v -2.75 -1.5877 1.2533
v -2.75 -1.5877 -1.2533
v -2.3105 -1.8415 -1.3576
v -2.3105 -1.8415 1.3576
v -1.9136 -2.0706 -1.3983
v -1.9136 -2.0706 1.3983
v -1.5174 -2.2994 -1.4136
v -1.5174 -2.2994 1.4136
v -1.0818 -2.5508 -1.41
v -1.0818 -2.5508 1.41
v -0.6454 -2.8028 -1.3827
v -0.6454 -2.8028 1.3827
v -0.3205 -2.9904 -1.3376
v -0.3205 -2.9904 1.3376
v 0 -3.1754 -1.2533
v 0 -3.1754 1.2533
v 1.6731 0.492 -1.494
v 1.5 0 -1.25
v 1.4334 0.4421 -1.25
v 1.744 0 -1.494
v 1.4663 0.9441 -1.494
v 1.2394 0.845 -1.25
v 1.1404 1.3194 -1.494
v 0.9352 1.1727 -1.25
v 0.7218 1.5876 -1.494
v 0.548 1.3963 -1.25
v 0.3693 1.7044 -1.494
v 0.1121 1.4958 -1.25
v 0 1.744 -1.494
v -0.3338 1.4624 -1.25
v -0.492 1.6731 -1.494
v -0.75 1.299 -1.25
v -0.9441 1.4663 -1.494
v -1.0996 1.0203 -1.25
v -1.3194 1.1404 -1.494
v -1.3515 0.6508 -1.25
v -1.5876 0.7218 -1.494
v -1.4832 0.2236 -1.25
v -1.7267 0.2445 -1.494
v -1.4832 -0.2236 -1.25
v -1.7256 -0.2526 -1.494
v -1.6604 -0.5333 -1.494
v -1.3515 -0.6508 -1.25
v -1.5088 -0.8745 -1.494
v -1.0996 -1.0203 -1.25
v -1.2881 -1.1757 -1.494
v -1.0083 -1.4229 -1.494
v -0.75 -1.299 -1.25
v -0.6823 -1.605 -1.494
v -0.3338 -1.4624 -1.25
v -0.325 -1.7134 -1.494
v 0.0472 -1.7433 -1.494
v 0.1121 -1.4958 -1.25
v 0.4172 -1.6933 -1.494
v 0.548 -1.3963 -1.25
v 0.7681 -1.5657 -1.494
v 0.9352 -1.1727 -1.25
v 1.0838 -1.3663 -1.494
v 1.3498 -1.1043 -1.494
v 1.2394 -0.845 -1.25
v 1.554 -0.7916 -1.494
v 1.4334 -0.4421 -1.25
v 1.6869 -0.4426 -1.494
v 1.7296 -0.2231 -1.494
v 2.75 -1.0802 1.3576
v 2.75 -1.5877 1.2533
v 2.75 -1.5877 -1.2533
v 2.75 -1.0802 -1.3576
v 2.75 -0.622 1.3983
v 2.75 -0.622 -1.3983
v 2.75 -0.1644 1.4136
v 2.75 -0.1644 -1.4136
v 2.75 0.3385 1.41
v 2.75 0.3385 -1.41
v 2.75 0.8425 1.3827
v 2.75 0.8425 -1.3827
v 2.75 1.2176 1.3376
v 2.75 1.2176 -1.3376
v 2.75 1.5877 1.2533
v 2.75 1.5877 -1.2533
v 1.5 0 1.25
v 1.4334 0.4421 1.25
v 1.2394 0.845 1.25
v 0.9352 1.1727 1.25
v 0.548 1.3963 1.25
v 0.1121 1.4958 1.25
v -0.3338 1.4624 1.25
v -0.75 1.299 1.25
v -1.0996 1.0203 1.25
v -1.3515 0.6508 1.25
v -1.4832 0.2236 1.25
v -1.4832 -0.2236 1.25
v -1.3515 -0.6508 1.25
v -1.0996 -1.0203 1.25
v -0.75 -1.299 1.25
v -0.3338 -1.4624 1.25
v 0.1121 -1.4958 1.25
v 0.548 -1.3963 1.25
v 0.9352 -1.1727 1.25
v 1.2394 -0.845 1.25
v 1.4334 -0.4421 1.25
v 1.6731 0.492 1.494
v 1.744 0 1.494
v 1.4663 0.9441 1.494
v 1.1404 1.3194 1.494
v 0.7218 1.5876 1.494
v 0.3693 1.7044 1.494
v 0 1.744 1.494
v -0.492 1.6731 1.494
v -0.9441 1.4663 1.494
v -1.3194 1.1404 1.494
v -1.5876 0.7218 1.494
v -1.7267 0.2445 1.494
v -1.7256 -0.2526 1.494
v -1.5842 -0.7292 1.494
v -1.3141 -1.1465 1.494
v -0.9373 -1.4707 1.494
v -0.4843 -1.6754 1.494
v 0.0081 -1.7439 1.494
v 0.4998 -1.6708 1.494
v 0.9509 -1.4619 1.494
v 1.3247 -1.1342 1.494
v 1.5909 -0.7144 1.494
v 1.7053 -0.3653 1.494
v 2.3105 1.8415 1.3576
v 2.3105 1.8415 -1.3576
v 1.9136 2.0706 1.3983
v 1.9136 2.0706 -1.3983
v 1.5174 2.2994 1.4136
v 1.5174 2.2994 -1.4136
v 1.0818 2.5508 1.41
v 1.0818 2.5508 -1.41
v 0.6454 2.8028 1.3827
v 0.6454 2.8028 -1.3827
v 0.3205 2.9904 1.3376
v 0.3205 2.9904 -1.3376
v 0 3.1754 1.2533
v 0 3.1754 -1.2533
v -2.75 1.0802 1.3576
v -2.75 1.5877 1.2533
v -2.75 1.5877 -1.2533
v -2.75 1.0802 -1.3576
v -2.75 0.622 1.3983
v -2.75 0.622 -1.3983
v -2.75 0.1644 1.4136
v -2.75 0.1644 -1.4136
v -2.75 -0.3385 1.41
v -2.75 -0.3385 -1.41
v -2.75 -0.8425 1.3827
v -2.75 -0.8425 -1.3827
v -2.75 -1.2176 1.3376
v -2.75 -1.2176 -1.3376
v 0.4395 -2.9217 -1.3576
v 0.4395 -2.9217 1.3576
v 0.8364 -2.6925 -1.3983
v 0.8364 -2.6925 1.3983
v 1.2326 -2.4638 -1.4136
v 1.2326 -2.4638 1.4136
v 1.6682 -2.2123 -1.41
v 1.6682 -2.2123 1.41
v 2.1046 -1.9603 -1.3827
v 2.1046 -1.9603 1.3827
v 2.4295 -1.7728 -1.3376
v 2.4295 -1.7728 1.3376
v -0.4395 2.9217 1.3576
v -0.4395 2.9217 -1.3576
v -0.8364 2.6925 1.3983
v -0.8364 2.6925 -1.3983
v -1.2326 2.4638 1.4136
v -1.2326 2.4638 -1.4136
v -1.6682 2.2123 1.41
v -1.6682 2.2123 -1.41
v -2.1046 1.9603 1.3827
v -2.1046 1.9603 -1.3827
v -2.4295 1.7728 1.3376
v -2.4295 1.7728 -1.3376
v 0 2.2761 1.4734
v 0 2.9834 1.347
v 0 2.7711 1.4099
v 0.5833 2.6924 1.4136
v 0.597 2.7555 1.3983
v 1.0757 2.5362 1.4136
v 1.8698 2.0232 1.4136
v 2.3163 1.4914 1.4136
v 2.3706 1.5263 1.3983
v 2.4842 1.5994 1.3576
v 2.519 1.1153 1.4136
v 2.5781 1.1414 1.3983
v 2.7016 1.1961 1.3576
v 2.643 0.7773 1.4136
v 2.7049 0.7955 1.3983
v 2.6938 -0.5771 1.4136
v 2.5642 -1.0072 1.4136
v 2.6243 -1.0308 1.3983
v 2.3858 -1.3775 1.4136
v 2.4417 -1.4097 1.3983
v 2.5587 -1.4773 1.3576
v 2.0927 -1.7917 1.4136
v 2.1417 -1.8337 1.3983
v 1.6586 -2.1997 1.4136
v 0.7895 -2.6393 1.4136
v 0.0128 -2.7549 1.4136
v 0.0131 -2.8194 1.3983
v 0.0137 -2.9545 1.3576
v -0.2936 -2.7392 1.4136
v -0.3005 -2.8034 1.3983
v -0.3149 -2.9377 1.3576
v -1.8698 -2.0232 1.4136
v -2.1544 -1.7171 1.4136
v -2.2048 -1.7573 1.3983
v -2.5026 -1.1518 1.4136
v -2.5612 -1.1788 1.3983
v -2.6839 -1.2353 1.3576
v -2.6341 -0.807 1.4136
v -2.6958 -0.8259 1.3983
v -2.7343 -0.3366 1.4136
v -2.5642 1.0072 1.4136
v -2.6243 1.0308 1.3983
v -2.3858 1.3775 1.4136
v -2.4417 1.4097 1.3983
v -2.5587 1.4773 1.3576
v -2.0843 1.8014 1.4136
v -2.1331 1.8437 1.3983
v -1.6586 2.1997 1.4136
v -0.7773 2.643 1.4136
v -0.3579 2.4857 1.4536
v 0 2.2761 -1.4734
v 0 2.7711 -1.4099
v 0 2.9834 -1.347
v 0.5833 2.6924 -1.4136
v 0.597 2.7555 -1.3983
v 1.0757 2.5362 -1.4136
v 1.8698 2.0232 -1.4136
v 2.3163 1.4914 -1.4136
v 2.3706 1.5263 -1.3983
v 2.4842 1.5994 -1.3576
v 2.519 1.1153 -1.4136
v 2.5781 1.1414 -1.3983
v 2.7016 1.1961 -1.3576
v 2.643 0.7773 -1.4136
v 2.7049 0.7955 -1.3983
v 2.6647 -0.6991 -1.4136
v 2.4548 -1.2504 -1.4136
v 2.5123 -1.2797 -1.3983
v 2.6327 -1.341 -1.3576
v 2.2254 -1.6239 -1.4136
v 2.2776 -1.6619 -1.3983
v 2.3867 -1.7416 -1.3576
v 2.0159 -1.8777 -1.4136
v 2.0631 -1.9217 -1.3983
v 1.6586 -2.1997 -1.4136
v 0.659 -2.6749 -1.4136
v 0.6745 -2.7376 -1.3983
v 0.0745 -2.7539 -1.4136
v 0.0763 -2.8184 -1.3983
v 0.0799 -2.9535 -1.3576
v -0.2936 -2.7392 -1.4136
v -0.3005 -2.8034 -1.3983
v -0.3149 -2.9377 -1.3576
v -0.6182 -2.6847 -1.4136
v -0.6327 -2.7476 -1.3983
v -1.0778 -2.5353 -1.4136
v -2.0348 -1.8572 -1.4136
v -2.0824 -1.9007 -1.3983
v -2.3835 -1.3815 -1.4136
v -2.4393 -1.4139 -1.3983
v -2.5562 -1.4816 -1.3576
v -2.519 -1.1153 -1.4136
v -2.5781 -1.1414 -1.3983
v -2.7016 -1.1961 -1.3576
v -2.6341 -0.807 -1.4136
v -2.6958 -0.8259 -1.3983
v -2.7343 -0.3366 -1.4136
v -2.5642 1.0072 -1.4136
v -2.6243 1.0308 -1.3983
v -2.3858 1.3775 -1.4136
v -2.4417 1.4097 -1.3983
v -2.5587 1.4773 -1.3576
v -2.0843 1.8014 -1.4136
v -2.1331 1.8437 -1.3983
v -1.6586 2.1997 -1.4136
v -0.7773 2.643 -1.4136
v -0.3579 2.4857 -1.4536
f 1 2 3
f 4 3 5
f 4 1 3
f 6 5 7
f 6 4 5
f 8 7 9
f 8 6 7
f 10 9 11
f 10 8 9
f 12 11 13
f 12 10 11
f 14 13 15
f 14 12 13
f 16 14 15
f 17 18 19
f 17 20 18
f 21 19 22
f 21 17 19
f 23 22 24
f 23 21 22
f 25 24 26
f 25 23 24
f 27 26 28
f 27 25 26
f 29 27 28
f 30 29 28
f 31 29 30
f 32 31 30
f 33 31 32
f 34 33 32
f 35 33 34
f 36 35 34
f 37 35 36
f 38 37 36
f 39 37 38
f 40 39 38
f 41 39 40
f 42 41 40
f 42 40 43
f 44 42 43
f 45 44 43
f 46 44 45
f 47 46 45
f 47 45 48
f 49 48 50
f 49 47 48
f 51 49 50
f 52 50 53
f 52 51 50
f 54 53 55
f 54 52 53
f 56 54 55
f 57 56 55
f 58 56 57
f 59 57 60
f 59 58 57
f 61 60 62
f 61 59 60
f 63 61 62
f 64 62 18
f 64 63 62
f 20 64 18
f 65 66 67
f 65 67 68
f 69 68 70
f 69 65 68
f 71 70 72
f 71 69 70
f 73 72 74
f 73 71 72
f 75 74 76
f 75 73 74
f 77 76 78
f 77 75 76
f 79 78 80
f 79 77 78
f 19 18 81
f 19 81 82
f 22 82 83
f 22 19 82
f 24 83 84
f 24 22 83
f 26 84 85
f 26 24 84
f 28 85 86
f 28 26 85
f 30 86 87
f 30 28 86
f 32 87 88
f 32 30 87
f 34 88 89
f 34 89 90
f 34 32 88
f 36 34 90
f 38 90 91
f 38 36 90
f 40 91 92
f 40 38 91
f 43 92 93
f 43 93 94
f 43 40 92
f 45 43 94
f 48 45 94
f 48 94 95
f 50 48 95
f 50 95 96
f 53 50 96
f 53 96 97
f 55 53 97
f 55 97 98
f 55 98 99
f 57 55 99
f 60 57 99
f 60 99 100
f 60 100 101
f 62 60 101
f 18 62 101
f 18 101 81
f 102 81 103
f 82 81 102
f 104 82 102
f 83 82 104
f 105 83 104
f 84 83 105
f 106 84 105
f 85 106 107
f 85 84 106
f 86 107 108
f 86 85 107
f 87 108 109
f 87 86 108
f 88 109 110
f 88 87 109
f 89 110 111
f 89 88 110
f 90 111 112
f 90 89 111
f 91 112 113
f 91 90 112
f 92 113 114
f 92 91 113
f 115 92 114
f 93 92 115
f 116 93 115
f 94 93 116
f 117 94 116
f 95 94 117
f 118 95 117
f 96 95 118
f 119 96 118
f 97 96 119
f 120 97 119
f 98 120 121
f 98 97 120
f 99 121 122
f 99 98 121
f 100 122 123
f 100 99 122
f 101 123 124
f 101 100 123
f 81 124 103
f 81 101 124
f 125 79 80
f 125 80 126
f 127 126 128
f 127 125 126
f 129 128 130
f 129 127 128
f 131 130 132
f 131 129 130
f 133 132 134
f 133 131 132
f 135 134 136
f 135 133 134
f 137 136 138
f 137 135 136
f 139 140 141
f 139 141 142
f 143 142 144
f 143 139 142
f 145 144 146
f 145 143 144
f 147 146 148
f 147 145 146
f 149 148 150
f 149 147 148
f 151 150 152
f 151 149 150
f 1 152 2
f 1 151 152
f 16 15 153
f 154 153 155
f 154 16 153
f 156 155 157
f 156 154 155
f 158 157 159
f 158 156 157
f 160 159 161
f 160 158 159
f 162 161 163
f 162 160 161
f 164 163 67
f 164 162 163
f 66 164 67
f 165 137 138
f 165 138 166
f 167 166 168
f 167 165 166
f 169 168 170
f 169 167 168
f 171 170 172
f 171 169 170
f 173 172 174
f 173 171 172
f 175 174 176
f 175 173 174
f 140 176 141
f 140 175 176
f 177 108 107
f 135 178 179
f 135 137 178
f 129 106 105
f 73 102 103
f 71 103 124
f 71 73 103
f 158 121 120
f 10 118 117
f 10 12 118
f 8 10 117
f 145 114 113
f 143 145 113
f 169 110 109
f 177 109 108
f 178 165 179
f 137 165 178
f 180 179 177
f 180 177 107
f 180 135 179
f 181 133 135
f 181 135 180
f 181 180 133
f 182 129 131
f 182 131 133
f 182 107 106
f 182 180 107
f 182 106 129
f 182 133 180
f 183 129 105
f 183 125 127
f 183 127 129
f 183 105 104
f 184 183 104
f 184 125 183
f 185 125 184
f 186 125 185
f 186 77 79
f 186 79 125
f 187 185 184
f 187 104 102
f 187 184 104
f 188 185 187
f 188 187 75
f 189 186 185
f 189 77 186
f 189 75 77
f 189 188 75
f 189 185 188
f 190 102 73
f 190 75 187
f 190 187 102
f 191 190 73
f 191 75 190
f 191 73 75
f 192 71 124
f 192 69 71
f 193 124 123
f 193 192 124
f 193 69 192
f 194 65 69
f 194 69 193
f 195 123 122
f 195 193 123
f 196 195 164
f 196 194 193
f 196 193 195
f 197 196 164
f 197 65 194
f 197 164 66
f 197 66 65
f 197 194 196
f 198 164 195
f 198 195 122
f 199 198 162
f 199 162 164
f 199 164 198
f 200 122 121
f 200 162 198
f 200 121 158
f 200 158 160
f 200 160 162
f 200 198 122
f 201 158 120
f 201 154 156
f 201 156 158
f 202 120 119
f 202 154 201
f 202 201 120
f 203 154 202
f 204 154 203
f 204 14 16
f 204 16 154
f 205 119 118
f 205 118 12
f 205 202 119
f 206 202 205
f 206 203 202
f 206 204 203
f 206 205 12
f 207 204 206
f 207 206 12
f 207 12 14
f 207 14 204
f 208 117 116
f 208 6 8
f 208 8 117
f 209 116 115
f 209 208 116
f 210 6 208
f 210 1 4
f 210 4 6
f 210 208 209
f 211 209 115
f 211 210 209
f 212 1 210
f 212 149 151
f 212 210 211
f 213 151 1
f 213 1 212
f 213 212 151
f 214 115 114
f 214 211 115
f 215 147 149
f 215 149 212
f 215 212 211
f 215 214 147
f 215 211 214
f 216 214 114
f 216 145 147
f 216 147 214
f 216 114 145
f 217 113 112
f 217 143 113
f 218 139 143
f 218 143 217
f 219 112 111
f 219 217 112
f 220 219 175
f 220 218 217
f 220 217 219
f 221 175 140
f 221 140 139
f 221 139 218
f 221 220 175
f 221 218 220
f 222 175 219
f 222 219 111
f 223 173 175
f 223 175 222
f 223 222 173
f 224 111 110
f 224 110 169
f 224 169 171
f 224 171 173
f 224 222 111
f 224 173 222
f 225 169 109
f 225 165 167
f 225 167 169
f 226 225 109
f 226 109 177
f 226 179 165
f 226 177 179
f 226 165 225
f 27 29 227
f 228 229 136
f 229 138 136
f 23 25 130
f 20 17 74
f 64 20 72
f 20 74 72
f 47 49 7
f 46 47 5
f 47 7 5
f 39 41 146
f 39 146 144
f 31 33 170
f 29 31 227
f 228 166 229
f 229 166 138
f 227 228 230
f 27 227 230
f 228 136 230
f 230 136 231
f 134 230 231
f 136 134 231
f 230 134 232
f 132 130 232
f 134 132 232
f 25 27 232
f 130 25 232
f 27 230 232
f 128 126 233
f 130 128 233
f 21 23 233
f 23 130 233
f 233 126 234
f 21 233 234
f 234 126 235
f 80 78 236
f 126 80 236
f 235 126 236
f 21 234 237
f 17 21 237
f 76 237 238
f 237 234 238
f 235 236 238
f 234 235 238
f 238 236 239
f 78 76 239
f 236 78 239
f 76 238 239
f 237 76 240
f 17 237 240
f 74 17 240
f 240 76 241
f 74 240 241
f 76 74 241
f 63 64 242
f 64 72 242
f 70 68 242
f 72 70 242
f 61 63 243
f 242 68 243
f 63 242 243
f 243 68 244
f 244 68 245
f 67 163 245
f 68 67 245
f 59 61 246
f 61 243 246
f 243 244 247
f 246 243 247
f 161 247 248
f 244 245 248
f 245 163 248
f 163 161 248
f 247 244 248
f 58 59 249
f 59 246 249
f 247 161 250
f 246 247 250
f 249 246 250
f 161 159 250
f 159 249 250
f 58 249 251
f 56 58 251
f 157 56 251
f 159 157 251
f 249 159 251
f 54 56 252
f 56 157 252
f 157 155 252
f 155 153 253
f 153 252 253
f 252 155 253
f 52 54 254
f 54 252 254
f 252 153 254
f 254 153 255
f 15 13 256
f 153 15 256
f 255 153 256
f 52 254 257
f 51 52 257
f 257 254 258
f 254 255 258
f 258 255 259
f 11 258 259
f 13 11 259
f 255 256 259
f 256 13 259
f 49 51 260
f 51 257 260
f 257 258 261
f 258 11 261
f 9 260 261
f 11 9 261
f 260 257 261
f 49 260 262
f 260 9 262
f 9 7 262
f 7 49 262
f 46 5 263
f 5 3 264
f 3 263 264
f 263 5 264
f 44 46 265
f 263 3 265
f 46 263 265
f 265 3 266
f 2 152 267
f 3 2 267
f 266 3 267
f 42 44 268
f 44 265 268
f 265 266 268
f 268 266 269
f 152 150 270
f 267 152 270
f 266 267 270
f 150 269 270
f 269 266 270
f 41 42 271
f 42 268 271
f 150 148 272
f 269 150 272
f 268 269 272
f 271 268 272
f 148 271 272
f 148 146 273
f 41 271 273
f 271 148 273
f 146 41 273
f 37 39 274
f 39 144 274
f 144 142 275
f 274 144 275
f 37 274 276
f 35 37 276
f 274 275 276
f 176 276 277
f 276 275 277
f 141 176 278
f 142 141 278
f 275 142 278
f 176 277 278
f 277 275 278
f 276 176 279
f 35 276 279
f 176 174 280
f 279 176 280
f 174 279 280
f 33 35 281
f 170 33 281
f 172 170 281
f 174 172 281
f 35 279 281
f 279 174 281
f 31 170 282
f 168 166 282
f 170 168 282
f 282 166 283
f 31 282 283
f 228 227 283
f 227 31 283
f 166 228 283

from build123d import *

# Parameters (mm, degrees)
F0_R     = 1.5
F1_DEPTH = 1.5
F2_SIZE  = 0.25
F3_SIZE  = 0.25


with BuildPart() as f1:
    # F0 (on Top) → F1 (new body, symmetric)
    with BuildSketch(Plane.XY):
        Polygon((2.75, -1.5877132403), (2.75, 1.5877132403), (0, 3.1754264805), (-2.75, 1.5877132403), (-2.75, -1.5877132403), (0, -3.1754264805), align=None)
        Circle(F0_R, mode=Mode.SUBTRACT)
    extrude(amount=F1_DEPTH, both=True)

    # F2
    f2_edges = [f1.edges().sort_by_distance(p)[0] for p in [
        (-1.5, 0, 1.5),
    ]]
    chamfer(f2_edges, length=F2_SIZE)

    # F3
    f3_edges = [f1.edges().sort_by_distance(p)[0] for p in [
        (-1.5, 0, -1.5),
    ]]
    chamfer(f3_edges, length=F3_SIZE)

    # F4 (on Right) → F5 (revolve, cut)
    with BuildSketch(Plane.YZ):
        with BuildLine():
            Line((0, 1.9006831571), (0, 1.5064009931))
            add(Edge.make_bspline(
                [(0, 1.5064009931), (1.5686472961, 1.5189287501), (1.4849199585, 1.48103808), (3.2688938081, 1.4612684026), (3.4663493279, 0.9027514607)],
                knots=[0, 0, 0, 0, 0.5303558422, 1, 1, 1, 1], degree=3))
            Line((3.4663493279, 0.9027514607), (3.4663493279, -0.9027514607))
            add(Edge.make_bspline(
                [(0, -1.5064009931), (1.5686472961, -1.5189287501), (1.4849199585, -1.48103808), (3.2688938081, -1.4612684026), (3.4663493279, -0.9027514607)],
                knots=[0, 0, 0, 0, 0.5303558422, 1, 1, 1, 1], degree=3))
            Line((0, -1.5064009931), (0, -1.8480797298))
            Line((0, -1.8480797298), (4.1224174201, -1.8480797298))
            Line((4.1224174201, -1.8480797298), (4.1224174201, 1.9006831571))
            Line((4.1224174201, 1.9006831571), (0, 1.9006831571))
        make_face()
    revolve(axis=Axis((0, 0, 0), (0, 0, -1)), mode=Mode.SUBTRACT)


solid = f1.part
